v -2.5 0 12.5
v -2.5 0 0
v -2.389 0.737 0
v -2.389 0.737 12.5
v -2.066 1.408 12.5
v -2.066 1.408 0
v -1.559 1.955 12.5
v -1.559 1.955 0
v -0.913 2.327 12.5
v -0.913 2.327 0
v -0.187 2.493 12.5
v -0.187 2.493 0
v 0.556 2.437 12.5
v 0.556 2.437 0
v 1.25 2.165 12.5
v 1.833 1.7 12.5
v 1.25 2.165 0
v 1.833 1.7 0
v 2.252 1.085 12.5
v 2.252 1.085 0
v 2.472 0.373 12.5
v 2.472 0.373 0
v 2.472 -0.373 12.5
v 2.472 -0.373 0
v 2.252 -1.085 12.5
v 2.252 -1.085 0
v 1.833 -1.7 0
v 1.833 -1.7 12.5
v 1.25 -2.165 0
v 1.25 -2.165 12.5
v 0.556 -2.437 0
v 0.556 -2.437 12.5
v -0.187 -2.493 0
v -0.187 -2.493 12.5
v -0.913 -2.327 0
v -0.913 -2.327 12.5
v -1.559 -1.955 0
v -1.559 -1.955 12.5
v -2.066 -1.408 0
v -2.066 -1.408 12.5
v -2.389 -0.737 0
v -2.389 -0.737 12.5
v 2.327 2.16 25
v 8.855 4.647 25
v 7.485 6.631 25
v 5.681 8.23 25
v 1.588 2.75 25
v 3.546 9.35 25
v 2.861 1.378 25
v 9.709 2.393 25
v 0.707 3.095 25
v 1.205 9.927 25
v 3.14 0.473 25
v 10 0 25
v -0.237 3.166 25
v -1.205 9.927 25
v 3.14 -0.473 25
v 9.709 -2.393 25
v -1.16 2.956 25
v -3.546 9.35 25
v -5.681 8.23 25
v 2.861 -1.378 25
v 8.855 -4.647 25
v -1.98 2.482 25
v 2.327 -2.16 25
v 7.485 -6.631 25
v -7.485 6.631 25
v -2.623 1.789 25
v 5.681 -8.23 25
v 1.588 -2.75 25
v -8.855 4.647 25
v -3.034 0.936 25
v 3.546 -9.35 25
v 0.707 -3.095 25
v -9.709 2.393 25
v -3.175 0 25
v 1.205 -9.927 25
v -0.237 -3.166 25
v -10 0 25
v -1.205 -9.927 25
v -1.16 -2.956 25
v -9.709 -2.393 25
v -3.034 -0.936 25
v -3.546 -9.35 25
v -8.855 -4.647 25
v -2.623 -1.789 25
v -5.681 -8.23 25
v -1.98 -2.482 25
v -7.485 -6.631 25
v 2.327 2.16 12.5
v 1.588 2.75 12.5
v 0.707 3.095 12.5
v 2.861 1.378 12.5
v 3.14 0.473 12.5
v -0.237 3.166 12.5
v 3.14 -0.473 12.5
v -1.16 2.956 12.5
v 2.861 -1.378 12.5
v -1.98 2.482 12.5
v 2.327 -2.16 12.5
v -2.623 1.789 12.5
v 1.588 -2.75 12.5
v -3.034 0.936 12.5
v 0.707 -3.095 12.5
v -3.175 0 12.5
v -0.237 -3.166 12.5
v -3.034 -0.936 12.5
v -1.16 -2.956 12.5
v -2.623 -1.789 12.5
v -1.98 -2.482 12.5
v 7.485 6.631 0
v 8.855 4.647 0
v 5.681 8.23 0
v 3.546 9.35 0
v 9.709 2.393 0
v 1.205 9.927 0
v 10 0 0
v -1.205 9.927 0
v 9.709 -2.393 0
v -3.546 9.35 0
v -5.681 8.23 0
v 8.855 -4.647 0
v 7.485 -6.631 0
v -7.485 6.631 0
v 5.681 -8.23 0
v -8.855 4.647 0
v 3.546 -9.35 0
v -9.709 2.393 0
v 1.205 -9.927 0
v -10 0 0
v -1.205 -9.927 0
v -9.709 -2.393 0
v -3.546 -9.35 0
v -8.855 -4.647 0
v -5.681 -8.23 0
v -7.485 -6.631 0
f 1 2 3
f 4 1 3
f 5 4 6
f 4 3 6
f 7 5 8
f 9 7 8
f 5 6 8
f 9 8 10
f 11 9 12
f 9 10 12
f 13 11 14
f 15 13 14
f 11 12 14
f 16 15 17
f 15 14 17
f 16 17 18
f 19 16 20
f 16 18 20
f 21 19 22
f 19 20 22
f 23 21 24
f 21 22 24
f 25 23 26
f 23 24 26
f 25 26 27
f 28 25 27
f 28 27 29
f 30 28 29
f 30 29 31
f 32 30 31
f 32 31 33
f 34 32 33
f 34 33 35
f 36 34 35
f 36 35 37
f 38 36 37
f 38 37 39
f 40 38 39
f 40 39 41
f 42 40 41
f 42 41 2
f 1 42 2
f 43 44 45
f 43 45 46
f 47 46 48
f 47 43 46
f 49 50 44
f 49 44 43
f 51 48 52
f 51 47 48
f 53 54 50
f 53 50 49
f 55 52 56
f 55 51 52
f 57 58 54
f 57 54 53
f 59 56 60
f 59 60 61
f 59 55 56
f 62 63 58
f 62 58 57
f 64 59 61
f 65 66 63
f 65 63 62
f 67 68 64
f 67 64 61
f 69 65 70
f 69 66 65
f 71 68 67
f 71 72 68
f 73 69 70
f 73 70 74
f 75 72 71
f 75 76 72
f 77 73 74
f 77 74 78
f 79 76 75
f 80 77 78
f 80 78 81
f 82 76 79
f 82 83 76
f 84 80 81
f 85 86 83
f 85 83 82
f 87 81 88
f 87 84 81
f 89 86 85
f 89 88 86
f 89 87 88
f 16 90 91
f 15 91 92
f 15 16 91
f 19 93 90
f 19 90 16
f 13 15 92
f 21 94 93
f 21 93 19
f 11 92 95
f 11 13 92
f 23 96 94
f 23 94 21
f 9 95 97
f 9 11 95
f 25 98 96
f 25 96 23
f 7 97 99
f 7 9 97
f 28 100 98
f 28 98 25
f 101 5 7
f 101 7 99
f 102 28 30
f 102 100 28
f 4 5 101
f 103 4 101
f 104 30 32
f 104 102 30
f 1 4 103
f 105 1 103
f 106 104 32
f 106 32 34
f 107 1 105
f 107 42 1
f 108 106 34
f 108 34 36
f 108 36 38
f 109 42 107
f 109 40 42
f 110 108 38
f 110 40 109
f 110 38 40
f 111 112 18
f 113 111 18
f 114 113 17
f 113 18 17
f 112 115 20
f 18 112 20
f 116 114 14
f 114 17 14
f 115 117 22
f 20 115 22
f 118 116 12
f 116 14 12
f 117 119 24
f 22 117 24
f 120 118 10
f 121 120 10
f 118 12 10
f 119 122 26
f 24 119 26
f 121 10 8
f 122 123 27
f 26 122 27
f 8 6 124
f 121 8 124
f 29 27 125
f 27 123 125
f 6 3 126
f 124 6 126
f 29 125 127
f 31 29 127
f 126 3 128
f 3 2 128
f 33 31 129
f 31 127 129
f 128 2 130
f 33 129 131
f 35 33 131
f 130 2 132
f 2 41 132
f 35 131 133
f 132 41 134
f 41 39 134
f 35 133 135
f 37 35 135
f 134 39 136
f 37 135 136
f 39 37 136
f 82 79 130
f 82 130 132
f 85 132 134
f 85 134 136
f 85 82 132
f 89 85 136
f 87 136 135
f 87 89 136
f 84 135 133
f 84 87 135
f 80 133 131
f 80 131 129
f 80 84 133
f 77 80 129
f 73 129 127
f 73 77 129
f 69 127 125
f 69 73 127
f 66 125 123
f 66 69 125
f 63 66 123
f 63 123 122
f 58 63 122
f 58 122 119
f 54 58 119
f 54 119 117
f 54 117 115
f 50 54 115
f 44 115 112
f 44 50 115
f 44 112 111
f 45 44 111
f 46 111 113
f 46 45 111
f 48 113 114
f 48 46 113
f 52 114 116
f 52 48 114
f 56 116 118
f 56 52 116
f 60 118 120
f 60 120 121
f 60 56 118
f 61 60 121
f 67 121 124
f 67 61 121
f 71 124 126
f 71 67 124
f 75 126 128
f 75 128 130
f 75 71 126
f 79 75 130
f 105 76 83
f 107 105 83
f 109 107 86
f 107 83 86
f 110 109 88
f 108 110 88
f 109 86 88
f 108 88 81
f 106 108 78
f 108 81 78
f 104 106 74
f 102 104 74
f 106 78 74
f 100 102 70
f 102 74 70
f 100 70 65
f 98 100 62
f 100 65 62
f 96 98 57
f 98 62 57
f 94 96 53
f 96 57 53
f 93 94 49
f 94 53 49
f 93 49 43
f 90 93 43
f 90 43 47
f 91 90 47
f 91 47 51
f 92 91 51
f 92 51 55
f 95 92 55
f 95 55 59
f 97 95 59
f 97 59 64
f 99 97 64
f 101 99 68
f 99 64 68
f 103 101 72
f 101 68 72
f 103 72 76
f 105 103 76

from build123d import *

# Parameters (mm, degrees)
SKETCH1_R           = 10
BOSS_EXTRUDE1_DEPTH = 25
SKETCH2_R           = 3.175
CUT_EXTRUDE1_DEPTH  = 12.5
SKETCH3_R           = 2.5
CUT_EXTRUDE2_DEPTH  = 29.722813233


with BuildPart() as part:
    # Sketch1 → Boss-Extrude1 (new body)
    with BuildSketch(Plane.XY.offset(25)):
        Circle(SKETCH1_R)
    extrude(amount=-BOSS_EXTRUDE1_DEPTH)

    # Sketch2 → Cut-Extrude1 (cut)
    with BuildSketch(Plane.XY.offset(25)):
        Circle(SKETCH2_R)
    extrude(amount=-CUT_EXTRUDE1_DEPTH, mode=Mode.SUBTRACT)

    # Sketch3 → Cut-Extrude2 (cut, through all)
    with BuildSketch(Plane(origin=(0, 0, 0), x_dir=(-1, 0, 0), z_dir=(0, 0, -1))):
        Circle(SKETCH3_R)
    extrude(amount=-CUT_EXTRUDE2_DEPTH, mode=Mode.SUBTRACT)


solid = part.part
